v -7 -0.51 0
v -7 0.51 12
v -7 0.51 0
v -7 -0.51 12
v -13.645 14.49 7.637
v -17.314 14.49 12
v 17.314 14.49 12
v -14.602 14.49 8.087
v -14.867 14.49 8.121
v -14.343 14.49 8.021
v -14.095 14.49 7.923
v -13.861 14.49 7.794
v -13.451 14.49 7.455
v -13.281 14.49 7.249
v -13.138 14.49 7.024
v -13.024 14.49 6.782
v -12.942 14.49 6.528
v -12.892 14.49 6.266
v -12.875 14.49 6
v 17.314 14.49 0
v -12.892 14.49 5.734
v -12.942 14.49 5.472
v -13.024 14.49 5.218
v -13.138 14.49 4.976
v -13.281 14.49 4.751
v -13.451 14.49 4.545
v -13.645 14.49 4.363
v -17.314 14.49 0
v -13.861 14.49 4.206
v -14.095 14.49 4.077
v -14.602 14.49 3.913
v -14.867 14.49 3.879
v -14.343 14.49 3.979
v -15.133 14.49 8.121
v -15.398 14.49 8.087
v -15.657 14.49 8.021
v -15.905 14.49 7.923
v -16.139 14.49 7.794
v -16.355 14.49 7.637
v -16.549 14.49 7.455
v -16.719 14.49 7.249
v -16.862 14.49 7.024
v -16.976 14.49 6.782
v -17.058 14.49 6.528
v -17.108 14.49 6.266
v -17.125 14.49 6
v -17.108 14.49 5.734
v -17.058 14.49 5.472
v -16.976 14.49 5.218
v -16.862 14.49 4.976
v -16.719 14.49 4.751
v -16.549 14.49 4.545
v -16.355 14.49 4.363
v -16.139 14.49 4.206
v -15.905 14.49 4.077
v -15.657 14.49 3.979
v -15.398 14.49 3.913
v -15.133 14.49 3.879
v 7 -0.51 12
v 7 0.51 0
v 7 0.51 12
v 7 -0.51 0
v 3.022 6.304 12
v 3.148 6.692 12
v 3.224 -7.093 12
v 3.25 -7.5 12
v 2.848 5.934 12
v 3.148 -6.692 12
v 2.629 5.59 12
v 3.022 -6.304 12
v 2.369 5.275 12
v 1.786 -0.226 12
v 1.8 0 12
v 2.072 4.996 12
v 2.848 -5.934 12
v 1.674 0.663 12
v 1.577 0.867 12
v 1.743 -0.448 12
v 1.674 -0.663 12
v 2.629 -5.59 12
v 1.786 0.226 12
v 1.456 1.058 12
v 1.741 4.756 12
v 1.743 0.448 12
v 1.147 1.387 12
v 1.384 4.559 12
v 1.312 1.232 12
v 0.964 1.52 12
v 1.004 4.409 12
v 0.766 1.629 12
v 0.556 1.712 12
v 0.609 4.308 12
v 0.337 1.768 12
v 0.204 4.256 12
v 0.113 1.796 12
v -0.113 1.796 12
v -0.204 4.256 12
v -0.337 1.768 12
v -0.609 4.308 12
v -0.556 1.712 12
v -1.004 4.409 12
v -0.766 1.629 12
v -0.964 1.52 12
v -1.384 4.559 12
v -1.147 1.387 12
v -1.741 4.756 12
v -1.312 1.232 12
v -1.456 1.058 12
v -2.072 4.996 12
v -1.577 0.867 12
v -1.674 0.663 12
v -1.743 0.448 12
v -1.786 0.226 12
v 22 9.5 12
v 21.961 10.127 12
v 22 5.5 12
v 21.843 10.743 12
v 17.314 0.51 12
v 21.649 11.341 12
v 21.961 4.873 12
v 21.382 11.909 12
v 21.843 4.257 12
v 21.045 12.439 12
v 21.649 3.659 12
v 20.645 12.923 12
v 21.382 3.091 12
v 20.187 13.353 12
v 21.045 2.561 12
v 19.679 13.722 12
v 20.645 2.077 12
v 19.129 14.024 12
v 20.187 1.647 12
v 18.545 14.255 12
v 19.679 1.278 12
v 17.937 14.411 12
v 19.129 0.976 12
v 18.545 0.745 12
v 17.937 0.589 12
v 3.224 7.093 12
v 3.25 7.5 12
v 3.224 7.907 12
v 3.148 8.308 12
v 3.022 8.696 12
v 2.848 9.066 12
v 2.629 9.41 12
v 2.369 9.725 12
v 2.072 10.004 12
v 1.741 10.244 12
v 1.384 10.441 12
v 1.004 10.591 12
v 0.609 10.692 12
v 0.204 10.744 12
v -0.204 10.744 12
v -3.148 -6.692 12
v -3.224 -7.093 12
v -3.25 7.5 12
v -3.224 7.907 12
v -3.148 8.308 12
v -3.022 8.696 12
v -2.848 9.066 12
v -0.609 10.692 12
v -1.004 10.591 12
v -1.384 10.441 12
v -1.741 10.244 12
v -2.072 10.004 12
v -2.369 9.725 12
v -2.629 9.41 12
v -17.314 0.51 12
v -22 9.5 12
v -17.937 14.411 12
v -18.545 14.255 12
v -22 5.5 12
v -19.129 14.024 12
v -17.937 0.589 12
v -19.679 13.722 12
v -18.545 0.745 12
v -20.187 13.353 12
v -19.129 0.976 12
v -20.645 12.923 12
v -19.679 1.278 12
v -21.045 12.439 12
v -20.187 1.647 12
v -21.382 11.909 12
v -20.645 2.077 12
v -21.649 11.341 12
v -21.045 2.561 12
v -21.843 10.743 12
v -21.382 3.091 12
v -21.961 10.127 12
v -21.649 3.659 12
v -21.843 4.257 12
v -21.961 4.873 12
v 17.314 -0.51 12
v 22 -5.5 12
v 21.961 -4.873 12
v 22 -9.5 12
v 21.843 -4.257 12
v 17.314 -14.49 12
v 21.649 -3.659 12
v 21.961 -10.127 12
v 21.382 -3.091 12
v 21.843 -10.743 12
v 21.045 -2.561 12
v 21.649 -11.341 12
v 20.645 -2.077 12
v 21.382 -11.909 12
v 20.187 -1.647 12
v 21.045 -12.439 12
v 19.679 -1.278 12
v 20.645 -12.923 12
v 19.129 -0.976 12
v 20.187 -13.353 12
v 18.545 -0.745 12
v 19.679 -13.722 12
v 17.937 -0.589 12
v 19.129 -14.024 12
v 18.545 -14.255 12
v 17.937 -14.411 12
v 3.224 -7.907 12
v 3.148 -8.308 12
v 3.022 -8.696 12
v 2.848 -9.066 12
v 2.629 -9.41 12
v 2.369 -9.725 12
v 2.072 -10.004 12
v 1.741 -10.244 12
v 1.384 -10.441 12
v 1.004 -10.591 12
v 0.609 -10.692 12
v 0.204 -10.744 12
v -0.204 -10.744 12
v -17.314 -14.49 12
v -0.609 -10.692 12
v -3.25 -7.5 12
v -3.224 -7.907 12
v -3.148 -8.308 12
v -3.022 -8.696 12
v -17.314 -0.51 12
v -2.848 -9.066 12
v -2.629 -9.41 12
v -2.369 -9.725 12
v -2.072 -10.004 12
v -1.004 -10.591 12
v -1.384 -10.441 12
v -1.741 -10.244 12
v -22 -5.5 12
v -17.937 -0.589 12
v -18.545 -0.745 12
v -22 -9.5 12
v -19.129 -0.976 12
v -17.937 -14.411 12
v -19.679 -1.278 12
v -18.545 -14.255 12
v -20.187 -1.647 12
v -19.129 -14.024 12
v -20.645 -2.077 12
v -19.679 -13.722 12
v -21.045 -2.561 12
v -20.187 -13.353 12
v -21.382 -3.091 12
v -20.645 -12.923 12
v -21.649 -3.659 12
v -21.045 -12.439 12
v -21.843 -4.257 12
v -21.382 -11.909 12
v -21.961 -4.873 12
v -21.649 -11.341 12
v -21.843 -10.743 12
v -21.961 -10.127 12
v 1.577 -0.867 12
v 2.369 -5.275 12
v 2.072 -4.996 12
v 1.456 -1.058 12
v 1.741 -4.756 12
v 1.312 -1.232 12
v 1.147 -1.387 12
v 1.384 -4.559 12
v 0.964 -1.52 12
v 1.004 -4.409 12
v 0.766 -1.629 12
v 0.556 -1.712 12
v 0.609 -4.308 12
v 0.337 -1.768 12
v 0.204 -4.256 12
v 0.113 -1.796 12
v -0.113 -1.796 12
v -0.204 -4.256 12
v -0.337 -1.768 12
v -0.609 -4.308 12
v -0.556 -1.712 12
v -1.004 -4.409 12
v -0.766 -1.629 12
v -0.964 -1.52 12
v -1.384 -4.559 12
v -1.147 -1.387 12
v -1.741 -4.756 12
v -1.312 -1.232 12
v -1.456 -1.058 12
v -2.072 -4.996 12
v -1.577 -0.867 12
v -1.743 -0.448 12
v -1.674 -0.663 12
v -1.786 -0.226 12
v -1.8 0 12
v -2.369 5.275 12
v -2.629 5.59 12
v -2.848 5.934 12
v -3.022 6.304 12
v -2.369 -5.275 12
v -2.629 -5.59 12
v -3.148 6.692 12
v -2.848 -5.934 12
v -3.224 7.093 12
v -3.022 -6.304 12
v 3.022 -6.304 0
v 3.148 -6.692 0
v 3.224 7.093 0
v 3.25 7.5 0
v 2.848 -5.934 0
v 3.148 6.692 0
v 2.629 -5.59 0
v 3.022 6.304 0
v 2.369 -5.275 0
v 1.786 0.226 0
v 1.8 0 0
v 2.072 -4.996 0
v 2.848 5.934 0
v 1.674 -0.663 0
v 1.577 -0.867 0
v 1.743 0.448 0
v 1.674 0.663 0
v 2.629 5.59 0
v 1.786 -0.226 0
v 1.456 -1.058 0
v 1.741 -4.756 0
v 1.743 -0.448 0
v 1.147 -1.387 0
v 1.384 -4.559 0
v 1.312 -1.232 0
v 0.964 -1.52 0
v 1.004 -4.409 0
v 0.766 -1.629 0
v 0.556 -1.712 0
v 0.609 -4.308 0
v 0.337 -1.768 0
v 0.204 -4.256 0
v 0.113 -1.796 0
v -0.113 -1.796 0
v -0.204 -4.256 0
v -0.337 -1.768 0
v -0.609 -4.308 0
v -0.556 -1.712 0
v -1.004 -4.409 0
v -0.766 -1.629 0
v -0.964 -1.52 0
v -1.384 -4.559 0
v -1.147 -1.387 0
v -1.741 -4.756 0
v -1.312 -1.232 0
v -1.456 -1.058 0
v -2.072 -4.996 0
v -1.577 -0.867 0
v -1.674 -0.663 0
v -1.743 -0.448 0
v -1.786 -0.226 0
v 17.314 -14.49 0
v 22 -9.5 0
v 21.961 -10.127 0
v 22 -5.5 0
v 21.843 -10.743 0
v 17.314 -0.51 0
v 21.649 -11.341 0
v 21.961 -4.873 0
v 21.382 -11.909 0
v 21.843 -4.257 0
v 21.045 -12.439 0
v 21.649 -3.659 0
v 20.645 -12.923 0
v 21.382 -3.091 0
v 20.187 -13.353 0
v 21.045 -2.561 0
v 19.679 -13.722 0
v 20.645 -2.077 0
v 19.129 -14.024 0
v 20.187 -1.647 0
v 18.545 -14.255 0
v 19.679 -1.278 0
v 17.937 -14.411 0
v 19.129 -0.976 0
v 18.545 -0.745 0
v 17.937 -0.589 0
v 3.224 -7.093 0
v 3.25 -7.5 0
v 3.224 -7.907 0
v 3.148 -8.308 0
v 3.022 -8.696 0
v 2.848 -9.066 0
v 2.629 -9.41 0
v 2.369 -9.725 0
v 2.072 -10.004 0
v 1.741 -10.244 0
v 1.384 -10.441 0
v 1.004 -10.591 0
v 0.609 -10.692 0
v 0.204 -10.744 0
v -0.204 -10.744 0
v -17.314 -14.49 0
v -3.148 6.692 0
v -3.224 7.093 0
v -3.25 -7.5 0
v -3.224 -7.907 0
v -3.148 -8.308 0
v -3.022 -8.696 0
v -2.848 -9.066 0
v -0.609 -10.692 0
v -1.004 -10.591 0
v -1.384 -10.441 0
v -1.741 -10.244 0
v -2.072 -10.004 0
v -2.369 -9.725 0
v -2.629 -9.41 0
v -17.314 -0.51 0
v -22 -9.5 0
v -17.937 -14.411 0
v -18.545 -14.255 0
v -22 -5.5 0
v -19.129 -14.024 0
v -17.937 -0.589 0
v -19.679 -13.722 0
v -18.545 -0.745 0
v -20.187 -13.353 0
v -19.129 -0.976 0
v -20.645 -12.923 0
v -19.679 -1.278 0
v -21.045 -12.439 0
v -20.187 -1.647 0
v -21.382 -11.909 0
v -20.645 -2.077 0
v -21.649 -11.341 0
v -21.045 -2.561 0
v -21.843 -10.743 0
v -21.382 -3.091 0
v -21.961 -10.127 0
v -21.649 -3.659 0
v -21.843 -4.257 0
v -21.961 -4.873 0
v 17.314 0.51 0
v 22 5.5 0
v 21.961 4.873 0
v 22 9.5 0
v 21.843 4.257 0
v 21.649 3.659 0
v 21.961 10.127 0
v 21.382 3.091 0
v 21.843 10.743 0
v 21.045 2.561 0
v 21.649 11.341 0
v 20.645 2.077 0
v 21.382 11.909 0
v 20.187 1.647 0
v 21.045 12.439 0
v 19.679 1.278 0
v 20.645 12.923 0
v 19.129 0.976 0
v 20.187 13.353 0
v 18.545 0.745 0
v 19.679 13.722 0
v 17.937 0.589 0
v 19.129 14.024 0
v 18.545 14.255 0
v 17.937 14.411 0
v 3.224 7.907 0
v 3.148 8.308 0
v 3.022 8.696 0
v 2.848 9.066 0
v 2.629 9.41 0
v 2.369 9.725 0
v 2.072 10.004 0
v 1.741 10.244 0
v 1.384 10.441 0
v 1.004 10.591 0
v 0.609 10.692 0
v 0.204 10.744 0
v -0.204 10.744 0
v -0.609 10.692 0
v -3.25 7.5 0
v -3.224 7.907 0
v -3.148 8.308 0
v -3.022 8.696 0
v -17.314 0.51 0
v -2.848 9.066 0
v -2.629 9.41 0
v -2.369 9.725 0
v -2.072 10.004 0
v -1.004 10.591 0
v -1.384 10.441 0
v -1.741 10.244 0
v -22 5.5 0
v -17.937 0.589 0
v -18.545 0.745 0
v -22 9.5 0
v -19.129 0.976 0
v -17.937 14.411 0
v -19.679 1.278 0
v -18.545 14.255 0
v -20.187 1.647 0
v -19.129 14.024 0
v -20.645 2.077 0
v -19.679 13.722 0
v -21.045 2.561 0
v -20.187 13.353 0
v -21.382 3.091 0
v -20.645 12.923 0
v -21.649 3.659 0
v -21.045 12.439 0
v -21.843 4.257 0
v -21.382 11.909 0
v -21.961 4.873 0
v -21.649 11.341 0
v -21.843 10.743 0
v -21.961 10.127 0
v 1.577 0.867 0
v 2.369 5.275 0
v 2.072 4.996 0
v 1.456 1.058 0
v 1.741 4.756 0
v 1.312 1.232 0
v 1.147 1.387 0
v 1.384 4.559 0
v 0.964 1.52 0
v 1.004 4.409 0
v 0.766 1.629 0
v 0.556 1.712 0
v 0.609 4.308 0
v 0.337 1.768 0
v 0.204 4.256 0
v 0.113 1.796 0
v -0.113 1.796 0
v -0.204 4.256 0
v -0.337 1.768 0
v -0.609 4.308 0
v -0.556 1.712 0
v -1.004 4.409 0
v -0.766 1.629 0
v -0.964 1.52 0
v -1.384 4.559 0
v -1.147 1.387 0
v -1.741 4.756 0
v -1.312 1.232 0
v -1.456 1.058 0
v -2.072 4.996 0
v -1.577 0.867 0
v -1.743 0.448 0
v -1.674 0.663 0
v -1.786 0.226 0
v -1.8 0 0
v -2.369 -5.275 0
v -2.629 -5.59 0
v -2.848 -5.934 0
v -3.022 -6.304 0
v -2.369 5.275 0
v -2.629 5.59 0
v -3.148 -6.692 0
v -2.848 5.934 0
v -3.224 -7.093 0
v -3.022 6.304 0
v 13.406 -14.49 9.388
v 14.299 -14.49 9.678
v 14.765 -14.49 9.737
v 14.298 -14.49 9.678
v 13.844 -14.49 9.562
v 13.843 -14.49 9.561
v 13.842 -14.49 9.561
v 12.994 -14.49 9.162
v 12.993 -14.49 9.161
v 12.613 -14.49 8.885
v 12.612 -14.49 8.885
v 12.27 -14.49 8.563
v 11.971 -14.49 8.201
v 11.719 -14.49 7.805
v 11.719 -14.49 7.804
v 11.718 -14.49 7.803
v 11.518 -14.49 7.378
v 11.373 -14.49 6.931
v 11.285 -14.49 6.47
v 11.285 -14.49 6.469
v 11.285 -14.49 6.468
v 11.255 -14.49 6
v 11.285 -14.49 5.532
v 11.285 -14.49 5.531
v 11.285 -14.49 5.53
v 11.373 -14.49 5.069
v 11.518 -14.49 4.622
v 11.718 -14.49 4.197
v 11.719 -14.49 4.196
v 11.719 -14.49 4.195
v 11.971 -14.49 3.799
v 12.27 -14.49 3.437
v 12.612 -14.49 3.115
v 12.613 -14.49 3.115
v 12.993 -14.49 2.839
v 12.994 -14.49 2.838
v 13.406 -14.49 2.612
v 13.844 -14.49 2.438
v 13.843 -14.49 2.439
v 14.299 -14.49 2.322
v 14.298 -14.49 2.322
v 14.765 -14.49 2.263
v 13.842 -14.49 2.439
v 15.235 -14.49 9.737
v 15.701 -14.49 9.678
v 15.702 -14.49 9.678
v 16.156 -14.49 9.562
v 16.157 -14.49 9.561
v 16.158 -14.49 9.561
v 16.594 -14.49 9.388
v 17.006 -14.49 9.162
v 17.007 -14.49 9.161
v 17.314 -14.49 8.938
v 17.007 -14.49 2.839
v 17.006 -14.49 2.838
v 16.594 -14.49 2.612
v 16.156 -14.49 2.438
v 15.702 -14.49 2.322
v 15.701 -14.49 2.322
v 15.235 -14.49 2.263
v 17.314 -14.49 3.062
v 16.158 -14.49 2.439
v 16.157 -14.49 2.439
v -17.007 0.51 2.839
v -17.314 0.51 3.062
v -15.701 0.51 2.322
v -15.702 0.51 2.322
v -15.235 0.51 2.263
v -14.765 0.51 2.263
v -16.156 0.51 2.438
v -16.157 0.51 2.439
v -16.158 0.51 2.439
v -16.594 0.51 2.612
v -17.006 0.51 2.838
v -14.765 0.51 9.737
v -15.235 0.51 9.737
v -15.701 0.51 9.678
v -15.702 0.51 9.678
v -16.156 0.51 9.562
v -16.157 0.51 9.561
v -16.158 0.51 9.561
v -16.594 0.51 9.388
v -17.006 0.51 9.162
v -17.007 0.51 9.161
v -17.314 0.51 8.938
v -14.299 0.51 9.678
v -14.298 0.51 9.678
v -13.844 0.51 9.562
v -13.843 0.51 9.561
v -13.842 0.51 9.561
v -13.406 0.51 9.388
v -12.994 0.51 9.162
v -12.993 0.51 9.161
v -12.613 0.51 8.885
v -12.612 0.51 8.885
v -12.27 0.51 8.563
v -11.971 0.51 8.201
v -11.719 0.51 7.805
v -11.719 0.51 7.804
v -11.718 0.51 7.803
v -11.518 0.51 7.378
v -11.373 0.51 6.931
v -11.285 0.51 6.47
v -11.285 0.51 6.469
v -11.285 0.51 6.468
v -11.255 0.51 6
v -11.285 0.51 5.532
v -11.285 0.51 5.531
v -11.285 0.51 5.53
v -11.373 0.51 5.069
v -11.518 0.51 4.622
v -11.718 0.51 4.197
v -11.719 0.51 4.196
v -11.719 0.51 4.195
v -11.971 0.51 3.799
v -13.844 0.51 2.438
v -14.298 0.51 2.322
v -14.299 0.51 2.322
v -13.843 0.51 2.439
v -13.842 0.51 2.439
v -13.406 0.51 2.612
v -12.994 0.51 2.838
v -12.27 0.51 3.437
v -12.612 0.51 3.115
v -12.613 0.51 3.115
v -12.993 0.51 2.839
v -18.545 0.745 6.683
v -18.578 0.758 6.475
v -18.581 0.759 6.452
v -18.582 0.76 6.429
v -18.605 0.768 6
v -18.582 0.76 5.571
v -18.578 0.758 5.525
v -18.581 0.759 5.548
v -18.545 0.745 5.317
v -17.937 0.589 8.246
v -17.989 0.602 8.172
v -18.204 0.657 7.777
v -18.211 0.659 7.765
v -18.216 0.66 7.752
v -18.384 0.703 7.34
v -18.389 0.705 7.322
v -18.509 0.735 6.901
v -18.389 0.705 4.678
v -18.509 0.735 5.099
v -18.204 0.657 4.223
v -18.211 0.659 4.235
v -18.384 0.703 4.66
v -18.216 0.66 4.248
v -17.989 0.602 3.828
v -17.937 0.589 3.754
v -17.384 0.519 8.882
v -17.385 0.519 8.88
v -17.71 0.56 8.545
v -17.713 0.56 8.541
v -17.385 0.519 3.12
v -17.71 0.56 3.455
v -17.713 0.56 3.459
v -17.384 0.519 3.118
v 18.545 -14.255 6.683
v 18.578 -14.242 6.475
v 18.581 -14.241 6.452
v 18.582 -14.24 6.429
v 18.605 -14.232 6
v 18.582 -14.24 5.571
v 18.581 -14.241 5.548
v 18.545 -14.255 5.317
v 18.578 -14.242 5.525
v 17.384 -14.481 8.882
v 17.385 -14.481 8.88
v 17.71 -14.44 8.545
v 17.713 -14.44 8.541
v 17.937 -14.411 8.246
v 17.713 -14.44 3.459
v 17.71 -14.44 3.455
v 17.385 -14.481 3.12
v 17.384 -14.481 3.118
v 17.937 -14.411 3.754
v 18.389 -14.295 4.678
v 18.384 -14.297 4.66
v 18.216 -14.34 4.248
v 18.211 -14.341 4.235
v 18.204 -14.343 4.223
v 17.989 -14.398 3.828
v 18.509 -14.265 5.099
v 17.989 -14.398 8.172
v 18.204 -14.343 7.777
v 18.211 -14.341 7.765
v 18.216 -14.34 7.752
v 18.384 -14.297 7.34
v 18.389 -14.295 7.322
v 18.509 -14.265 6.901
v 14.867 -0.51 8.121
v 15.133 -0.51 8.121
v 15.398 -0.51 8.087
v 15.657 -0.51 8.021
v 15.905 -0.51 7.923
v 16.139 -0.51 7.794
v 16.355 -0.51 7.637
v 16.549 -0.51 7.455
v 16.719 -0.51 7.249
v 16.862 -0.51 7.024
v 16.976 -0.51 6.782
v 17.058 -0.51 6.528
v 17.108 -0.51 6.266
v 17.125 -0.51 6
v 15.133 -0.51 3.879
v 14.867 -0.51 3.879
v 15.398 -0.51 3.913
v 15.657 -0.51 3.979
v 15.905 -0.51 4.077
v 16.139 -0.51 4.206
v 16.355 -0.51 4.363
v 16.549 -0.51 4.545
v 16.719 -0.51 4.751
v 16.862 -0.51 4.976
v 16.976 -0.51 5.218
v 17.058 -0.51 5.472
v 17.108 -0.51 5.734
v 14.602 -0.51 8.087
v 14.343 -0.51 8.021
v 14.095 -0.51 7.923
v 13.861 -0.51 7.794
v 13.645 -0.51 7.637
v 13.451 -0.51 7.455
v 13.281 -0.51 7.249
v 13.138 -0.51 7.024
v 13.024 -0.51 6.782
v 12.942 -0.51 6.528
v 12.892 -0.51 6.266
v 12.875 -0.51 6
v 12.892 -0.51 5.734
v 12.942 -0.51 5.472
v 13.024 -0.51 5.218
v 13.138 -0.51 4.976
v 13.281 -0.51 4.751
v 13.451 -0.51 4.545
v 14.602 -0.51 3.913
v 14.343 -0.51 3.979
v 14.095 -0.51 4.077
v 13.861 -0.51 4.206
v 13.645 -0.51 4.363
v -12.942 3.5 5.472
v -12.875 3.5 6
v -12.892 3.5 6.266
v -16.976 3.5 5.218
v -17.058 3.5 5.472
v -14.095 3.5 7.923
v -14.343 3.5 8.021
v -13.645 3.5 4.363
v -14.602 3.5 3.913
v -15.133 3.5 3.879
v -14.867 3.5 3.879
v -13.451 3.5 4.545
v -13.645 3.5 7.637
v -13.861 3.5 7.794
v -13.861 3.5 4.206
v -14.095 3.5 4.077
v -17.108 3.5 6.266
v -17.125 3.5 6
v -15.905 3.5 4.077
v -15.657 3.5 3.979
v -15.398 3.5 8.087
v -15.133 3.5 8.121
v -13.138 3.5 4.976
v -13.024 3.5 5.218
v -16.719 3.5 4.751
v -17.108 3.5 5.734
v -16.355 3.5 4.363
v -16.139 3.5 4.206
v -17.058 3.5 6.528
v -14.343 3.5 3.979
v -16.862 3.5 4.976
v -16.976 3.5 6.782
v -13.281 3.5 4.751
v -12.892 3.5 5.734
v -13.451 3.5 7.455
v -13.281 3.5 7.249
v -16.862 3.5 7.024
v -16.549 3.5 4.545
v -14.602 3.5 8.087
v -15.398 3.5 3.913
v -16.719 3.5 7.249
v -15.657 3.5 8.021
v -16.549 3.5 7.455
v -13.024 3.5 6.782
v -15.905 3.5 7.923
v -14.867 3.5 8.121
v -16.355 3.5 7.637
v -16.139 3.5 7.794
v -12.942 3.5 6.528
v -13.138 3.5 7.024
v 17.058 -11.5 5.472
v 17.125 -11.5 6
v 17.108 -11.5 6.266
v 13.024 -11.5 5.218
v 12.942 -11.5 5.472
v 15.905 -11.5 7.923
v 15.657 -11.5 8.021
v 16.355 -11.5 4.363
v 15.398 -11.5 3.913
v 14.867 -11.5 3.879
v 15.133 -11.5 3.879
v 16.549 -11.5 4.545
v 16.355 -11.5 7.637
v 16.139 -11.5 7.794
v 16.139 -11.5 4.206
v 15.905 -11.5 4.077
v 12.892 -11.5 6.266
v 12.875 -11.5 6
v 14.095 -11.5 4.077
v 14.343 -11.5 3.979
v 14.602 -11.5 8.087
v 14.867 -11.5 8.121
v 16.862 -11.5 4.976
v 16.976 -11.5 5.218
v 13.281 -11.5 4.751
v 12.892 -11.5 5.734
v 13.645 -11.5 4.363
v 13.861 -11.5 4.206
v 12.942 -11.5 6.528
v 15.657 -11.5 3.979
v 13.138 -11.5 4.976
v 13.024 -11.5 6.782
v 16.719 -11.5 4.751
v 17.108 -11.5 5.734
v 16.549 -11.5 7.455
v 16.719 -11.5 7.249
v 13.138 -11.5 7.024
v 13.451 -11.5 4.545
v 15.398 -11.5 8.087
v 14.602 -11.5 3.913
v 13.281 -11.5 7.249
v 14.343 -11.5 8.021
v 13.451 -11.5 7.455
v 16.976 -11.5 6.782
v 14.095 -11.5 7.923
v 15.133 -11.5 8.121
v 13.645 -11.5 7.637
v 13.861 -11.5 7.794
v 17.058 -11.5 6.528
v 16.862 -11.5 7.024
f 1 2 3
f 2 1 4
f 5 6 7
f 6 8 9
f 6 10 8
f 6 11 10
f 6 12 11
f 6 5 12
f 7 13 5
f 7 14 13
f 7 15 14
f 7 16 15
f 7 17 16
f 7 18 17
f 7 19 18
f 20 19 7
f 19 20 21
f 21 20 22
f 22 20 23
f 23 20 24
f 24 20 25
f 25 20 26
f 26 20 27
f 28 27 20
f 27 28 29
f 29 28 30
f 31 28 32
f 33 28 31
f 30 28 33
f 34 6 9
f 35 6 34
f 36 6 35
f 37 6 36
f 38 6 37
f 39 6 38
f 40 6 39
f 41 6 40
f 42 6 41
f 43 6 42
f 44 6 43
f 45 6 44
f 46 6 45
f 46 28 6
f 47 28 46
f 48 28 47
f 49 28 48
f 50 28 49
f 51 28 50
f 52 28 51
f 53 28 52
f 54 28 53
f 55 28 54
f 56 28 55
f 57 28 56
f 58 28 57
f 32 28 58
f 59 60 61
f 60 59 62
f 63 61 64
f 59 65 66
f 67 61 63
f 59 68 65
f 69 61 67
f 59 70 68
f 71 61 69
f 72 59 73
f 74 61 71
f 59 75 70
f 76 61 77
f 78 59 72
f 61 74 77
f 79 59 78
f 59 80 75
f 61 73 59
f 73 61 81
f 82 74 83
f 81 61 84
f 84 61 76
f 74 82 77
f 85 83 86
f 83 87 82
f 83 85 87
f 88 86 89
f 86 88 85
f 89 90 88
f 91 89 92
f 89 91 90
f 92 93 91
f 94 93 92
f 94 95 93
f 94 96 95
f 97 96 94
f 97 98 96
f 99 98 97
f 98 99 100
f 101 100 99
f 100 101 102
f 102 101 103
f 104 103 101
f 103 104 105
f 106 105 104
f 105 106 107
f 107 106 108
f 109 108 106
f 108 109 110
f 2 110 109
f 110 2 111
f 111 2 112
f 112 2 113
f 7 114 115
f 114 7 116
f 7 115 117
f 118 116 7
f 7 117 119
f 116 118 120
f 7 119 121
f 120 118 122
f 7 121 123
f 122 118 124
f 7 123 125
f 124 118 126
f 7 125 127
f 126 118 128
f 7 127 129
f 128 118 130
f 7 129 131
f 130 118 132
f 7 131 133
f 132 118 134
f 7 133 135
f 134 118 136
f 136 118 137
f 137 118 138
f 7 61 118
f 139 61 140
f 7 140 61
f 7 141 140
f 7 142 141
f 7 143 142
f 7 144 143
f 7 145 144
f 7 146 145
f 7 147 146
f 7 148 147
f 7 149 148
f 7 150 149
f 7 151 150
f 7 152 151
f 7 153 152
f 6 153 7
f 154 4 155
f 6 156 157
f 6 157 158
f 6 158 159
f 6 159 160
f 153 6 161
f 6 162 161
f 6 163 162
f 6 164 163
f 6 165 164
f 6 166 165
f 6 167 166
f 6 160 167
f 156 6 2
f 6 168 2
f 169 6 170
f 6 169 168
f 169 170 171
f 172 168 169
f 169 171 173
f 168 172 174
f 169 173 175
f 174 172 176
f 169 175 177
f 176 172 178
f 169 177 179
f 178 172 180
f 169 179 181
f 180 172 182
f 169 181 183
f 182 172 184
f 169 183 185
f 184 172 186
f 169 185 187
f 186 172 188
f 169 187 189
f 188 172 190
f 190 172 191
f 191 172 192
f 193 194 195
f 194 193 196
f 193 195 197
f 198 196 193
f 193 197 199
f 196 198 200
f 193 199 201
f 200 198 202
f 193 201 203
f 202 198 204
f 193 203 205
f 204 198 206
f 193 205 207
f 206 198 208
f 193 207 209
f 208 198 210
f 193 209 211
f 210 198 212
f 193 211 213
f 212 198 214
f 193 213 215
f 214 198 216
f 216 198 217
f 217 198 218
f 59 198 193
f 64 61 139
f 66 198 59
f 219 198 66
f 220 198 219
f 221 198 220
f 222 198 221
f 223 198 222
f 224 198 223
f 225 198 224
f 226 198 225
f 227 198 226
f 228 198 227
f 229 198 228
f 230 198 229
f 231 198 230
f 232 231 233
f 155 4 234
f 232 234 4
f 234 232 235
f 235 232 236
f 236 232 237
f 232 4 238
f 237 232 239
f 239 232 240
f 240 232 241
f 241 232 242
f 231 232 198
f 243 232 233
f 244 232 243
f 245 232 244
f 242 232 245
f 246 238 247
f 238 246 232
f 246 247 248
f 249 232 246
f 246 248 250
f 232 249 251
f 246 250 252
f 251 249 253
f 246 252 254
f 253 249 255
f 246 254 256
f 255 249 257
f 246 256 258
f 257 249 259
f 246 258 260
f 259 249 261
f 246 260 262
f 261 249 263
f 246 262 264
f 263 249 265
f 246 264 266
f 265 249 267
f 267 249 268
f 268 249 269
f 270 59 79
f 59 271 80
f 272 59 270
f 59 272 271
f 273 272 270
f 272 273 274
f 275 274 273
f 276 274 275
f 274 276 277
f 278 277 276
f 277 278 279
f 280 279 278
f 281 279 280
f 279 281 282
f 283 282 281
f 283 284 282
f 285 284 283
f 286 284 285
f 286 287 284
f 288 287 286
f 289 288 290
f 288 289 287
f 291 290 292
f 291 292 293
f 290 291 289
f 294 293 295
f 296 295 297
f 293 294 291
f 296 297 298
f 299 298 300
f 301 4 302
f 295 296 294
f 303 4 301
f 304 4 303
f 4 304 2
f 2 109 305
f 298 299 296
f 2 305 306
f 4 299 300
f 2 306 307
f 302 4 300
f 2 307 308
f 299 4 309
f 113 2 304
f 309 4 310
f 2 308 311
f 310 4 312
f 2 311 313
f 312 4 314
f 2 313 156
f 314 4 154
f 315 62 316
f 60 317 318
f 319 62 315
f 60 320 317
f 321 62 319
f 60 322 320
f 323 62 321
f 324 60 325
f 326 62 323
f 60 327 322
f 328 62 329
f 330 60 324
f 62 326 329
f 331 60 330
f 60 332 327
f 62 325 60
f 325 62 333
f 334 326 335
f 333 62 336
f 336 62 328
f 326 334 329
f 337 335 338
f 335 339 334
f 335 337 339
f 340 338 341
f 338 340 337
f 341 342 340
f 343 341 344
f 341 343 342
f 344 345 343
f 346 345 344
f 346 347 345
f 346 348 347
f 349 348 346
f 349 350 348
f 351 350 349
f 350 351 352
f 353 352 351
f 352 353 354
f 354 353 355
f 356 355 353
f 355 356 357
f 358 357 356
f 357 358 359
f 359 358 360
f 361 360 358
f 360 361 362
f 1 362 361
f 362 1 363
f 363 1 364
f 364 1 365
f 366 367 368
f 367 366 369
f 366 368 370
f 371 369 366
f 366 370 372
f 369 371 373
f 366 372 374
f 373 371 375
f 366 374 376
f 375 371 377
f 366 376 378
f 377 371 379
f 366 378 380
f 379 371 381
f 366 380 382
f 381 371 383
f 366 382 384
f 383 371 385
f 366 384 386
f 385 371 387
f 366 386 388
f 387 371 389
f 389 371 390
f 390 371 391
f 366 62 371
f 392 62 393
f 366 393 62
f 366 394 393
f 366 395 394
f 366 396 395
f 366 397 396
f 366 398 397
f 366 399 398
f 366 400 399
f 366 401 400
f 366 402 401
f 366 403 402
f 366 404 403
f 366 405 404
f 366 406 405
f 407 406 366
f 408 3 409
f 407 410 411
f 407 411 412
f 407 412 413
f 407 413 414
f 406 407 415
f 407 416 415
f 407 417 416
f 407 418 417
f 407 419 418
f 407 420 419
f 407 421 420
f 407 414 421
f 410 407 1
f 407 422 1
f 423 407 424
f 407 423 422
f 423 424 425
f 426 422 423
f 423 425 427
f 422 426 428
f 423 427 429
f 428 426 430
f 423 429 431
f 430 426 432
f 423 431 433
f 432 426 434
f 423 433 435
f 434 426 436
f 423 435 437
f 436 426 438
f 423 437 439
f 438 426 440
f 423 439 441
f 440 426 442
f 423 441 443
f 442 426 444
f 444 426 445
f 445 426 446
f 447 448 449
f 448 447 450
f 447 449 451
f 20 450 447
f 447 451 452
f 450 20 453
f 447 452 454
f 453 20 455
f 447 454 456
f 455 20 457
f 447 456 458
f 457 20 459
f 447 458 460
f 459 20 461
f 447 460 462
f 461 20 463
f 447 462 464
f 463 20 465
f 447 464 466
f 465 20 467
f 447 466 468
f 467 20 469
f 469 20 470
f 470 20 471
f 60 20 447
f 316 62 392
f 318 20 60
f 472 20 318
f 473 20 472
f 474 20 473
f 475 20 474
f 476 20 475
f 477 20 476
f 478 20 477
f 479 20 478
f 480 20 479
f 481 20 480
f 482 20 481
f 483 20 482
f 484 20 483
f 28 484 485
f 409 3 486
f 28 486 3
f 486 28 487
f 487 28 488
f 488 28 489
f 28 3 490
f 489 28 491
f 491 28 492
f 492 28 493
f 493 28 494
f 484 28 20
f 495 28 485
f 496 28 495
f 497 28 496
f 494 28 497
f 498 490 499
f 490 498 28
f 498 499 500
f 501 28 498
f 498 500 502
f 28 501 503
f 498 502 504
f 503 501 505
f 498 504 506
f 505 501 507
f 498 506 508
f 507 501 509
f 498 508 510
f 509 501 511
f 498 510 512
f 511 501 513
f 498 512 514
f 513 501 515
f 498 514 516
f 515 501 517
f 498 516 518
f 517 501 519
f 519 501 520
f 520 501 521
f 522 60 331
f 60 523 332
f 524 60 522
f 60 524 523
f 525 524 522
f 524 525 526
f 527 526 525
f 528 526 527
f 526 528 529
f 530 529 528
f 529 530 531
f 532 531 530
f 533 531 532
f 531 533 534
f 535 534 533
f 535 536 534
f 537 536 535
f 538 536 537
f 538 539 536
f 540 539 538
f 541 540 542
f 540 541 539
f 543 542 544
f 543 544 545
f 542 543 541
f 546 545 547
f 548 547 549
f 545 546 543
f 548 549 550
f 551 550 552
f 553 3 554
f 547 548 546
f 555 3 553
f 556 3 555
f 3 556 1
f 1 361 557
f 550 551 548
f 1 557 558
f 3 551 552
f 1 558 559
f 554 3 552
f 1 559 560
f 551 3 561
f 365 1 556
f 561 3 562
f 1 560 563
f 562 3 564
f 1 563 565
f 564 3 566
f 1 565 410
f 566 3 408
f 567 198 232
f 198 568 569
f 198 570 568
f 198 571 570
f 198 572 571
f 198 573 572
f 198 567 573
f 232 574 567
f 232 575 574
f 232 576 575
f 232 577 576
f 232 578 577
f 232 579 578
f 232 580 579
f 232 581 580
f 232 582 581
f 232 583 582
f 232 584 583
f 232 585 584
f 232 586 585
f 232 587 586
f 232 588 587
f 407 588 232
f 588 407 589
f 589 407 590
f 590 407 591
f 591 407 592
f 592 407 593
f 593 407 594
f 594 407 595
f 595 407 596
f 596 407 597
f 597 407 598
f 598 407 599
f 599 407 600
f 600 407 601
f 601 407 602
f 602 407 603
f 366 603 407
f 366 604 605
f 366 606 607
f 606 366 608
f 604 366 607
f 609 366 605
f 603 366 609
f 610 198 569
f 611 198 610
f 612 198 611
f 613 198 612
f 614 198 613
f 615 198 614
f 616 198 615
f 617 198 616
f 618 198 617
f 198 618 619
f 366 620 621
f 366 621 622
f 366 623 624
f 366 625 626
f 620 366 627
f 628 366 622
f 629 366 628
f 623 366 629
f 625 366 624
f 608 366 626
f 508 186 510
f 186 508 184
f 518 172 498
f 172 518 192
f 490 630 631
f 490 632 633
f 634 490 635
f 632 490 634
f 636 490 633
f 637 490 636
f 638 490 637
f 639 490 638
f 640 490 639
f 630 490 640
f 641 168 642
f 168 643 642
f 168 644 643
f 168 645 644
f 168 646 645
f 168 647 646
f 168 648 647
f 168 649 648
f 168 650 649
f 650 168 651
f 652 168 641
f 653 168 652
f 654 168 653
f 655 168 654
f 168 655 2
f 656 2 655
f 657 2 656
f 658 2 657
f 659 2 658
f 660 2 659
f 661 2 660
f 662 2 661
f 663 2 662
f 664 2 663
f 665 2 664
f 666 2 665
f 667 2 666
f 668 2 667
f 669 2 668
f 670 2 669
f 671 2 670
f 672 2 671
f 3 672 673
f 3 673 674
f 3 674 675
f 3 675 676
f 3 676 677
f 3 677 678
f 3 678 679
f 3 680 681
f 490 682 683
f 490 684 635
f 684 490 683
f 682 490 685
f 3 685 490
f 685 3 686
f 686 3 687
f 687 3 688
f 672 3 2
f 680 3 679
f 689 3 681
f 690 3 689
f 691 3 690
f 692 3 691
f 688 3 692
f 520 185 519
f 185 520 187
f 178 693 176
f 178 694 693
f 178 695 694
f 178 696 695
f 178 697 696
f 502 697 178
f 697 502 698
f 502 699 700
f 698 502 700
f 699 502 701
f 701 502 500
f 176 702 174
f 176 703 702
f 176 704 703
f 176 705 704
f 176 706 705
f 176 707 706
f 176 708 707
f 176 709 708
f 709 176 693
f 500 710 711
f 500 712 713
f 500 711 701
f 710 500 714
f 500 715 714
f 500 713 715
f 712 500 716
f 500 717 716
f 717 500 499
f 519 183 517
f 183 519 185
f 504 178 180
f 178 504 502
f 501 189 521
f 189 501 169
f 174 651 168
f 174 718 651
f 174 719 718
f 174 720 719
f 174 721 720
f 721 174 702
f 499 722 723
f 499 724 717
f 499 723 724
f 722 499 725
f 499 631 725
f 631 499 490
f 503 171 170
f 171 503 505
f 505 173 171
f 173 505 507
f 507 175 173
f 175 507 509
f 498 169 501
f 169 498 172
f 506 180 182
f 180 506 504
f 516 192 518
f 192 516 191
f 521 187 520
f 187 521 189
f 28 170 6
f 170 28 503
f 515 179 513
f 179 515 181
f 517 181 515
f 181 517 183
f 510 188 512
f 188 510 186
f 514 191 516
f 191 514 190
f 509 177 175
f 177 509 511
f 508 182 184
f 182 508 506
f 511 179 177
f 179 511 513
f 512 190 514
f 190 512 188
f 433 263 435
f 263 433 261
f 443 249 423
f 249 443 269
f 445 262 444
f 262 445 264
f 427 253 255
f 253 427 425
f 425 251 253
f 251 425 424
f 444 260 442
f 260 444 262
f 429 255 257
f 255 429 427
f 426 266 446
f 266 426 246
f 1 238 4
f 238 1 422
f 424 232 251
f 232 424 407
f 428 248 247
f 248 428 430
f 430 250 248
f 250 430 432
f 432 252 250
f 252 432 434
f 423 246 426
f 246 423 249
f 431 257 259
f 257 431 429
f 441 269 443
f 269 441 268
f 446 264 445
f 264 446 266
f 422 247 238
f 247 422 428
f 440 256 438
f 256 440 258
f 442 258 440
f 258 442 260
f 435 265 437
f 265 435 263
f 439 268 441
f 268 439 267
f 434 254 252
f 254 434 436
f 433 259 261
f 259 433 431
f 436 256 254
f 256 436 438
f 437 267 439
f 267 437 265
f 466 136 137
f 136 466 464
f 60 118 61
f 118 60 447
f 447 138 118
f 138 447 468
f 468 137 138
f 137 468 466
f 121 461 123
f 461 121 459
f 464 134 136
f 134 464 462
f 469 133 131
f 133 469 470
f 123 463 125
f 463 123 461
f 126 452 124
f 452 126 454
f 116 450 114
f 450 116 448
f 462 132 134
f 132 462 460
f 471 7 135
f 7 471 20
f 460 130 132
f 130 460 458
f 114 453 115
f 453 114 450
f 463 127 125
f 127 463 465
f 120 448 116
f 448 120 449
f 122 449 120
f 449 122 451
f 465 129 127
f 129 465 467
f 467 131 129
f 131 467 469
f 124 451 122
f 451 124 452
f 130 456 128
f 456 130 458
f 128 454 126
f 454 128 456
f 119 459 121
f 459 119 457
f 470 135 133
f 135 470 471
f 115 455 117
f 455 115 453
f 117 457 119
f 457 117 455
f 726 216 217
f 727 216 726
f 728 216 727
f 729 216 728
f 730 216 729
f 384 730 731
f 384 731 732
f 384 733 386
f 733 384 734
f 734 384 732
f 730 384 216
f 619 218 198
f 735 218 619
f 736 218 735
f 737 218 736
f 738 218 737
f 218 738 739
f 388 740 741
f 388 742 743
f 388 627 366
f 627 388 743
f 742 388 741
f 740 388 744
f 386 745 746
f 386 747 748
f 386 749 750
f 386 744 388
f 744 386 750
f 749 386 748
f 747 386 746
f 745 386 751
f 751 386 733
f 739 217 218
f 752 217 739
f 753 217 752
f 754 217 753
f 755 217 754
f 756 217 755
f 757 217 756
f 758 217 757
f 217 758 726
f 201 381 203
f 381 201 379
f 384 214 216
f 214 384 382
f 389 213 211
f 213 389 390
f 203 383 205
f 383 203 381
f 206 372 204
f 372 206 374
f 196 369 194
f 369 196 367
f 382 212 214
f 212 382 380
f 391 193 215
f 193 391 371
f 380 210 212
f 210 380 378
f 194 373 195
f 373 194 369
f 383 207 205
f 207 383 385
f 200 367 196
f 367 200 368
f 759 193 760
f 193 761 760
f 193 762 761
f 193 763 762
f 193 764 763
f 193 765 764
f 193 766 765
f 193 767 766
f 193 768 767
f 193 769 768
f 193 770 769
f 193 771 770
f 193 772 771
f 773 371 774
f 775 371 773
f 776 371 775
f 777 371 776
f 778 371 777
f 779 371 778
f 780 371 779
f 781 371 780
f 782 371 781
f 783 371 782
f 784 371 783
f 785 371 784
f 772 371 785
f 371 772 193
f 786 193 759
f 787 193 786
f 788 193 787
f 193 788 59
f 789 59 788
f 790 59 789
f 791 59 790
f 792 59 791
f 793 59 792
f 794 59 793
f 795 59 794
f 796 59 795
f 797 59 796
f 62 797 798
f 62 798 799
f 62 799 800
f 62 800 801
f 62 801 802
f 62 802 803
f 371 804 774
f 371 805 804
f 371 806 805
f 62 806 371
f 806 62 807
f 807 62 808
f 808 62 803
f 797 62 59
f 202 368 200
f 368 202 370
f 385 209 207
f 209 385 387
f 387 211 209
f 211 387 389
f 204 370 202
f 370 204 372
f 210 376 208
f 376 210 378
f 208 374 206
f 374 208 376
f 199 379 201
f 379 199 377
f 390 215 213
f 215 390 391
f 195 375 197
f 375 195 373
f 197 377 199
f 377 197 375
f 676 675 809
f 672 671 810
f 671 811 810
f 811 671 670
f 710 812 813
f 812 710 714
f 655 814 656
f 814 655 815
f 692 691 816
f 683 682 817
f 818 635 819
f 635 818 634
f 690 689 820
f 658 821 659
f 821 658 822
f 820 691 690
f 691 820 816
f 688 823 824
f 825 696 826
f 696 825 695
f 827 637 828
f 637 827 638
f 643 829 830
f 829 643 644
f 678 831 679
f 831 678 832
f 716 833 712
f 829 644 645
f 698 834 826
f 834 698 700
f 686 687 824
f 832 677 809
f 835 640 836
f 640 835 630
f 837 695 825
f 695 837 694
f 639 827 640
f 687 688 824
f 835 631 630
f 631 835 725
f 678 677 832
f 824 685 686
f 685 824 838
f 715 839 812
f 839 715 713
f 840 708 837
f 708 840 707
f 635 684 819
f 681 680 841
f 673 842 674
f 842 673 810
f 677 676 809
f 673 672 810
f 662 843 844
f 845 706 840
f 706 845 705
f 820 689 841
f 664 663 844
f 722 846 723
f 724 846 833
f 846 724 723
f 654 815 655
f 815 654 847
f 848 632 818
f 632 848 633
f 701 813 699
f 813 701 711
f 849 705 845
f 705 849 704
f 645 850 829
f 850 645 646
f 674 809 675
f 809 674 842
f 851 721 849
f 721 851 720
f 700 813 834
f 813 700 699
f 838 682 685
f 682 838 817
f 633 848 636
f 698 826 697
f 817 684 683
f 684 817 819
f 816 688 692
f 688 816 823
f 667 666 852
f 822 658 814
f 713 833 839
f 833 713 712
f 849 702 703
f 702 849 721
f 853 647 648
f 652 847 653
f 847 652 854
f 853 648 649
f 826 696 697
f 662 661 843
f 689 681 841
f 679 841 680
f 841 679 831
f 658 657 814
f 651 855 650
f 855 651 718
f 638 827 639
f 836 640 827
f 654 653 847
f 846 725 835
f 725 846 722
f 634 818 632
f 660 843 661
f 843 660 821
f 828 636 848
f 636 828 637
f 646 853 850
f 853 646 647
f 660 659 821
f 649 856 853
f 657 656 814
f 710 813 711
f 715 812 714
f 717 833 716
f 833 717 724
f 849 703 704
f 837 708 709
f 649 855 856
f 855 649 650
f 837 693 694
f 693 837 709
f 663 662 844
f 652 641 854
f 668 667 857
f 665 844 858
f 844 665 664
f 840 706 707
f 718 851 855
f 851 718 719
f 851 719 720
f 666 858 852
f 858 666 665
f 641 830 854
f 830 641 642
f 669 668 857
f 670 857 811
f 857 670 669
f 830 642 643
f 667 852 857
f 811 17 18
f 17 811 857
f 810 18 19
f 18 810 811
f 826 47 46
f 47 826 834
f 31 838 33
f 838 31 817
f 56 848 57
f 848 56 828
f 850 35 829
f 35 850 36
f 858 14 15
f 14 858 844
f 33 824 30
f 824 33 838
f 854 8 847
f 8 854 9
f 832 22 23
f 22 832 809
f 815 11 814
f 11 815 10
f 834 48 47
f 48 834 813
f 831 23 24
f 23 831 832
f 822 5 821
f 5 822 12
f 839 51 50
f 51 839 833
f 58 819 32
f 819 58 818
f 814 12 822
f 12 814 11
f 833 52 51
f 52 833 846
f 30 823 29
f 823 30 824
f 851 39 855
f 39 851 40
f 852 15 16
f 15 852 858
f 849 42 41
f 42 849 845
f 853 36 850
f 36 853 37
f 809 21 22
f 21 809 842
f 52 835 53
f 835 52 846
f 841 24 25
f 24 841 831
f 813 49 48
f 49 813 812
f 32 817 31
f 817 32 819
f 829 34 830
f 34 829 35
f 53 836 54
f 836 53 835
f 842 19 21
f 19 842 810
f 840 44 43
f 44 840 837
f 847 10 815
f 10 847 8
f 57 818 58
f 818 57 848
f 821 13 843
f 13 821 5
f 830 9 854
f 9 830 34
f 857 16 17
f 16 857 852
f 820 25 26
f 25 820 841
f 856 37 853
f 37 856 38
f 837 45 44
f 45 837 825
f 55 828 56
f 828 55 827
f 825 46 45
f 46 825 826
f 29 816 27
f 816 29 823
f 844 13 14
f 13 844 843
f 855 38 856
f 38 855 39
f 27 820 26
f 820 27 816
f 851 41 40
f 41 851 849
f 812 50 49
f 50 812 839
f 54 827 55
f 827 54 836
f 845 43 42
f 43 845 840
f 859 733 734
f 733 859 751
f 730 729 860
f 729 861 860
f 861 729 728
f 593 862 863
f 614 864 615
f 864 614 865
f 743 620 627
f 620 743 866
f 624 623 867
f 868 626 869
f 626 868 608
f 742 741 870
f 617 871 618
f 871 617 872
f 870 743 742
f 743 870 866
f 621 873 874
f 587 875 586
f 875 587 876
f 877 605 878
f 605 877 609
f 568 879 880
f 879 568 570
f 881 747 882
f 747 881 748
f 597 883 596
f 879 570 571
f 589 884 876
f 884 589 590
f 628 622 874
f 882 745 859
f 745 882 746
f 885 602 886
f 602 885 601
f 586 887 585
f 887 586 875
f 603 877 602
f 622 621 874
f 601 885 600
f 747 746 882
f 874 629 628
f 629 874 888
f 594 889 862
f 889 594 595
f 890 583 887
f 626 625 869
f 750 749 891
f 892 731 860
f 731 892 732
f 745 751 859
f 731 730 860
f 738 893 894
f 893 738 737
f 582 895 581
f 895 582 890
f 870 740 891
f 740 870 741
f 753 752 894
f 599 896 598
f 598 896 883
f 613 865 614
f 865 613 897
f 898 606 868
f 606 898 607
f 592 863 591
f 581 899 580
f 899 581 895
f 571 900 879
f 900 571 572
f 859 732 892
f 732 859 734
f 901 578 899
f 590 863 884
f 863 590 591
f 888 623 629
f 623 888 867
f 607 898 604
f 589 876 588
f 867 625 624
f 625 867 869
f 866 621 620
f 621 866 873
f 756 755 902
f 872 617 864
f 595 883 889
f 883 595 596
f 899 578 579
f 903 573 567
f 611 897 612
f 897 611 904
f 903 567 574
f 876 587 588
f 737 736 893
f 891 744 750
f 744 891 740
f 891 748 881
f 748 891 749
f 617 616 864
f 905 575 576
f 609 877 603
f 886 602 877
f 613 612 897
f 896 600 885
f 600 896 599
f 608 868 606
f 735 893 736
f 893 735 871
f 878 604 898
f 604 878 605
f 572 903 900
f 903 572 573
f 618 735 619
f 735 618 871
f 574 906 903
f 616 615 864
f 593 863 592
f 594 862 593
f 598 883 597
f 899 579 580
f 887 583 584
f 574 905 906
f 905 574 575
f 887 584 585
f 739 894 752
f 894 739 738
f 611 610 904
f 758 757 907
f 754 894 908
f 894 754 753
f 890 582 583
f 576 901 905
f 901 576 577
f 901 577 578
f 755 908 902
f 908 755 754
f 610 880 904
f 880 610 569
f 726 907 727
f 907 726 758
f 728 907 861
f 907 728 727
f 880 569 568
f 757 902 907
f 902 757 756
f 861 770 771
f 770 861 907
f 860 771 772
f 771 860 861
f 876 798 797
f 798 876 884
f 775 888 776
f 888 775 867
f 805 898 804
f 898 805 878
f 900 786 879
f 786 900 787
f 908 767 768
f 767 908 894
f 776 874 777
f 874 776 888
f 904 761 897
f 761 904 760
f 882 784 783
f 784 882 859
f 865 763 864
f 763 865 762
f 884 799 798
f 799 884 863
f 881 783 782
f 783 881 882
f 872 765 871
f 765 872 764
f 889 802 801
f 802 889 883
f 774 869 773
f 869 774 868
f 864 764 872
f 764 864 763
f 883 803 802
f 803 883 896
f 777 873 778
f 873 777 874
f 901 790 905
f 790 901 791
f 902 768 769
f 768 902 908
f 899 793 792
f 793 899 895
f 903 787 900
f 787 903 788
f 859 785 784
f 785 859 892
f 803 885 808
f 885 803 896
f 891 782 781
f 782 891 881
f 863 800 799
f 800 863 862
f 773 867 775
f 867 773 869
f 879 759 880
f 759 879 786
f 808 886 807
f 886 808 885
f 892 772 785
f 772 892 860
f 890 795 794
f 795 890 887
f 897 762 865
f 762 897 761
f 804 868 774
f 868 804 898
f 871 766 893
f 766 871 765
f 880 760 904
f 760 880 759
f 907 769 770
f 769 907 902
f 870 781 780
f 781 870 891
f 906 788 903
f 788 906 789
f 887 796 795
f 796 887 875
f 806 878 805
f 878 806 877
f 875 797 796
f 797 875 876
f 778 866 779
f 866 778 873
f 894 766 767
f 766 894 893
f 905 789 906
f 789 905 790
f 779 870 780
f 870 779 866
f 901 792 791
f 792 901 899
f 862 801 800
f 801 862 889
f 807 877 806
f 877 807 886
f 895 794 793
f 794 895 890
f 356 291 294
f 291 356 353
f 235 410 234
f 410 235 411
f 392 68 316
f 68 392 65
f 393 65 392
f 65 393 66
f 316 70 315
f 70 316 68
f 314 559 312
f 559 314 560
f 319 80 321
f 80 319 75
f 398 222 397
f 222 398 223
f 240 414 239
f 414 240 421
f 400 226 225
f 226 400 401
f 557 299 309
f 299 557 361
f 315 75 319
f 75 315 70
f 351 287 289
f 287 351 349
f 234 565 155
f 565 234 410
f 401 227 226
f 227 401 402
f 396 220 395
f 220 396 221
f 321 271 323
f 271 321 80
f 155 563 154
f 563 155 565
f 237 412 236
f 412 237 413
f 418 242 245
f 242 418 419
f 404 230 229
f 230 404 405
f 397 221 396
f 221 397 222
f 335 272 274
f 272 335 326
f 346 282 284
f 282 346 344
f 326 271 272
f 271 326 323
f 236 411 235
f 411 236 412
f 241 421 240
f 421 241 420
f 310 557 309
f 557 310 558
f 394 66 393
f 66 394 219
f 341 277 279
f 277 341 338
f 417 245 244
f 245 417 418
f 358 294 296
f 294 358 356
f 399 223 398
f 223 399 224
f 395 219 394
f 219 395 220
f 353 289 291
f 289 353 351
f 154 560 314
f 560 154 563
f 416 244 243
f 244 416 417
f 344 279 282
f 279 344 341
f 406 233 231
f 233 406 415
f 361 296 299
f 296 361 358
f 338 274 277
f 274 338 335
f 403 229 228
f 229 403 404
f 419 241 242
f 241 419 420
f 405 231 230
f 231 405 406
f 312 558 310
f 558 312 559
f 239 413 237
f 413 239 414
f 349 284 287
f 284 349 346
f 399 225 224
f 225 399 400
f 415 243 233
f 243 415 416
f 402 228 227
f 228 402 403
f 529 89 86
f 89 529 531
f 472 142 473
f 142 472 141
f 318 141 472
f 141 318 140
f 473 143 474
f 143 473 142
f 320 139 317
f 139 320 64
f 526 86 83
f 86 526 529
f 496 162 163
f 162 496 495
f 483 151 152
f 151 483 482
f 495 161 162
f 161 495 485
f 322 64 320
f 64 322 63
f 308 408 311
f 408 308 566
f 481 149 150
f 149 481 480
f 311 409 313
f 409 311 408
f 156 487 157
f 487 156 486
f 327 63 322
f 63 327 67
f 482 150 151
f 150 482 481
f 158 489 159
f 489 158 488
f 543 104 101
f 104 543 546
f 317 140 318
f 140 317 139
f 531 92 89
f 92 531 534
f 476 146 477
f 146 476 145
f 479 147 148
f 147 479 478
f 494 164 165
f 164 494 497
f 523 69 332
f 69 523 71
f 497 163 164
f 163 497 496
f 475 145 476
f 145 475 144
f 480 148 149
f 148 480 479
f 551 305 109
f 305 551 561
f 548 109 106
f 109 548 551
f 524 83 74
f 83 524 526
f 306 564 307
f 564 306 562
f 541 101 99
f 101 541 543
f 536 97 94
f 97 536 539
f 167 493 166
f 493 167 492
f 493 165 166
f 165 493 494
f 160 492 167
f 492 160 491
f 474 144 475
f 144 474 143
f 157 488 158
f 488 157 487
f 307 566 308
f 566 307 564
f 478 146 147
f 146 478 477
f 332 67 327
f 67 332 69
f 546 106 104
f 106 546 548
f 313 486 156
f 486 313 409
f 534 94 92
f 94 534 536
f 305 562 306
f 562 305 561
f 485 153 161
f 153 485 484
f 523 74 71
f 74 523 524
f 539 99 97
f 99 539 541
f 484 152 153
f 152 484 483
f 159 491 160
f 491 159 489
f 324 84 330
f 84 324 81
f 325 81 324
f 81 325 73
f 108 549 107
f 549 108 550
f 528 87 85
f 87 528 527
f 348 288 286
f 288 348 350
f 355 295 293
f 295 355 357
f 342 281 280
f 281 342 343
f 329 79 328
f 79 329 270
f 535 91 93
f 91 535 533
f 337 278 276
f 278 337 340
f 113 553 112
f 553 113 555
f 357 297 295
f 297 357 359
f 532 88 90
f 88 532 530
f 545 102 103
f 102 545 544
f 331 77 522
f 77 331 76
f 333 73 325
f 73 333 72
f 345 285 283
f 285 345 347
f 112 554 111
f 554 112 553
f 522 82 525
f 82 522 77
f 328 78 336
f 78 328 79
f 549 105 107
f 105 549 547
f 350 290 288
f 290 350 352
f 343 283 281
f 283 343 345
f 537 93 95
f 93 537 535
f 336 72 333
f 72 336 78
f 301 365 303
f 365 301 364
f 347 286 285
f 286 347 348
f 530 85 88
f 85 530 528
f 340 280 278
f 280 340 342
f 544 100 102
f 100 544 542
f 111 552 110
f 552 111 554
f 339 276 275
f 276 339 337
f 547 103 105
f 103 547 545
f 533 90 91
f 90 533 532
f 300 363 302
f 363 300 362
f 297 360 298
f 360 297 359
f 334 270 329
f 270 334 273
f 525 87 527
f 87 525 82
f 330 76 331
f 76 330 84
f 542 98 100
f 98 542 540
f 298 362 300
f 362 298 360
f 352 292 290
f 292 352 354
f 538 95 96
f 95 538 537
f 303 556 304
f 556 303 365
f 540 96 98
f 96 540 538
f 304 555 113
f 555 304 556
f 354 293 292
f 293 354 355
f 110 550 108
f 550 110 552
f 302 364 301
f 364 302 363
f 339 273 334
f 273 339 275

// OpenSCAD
$fn = 50;


difference() {
	union() {
		hull() {
			translate(v = [-2.0000000000, 9.5000000000, 0]) {
				cylinder(h = 12, r = 5);
			}
			translate(v = [2.0000000000, 9.5000000000, 0]) {
				cylinder(h = 12, r = 5);
			}
			translate(v = [-2.0000000000, -9.5000000000, 0]) {
				cylinder(h = 12, r = 5);
			}
			translate(v = [2.0000000000, -9.5000000000, 0]) {
				cylinder(h = 12, r = 5);
			}
		}
		translate(v = [-7.5000000000, 7.5000000000, 0]) {
			hull() {
				translate(v = [-9.5000000000, 2.0000000000, 0]) {
					cylinder(h = 12, r = 5);
				}
				translate(v = [9.5000000000, 2.0000000000, 0]) {
					cylinder(h = 12, r = 5);
				}
				translate(v = [-9.5000000000, -2.0000000000, 0]) {
					cylinder(h = 12, r = 5);
				}
				translate(v = [9.5000000000, -2.0000000000, 0]) {
					cylinder(h = 12, r = 5);
				}
			}
		}
		translate(v = [-7.5000000000, -7.5000000000, 0]) {
			hull() {
				translate(v = [-9.5000000000, 2.0000000000, 0]) {
					cylinder(h = 12, r = 5);
				}
				translate(v = [9.5000000000, 2.0000000000, 0]) {
					cylinder(h = 12, r = 5);
				}
				translate(v = [-9.5000000000, -2.0000000000, 0]) {
					cylinder(h = 12, r = 5);
				}
				translate(v = [9.5000000000, -2.0000000000, 0]) {
					cylinder(h = 12, r = 5);
				}
			}
		}
		translate(v = [7.5000000000, 7.5000000000, 0]) {
			hull() {
				translate(v = [-9.5000000000, 2.0000000000, 0]) {
					cylinder(h = 12, r = 5);
				}
				translate(v = [9.5000000000, 2.0000000000, 0]) {
					cylinder(h = 12, r = 5);
				}
				translate(v = [-9.5000000000, -2.0000000000, 0]) {
					cylinder(h = 12, r = 5);
				}
				translate(v = [9.5000000000, -2.0000000000, 0]) {
					cylinder(h = 12, r = 5);
				}
			}
		}
		translate(v = [7.5000000000, -7.5000000000, 0]) {
			hull() {
				translate(v = [-9.5000000000, 2.0000000000, 0]) {
					cylinder(h = 12, r = 5);
				}
				translate(v = [9.5000000000, 2.0000000000, 0]) {
					cylinder(h = 12, r = 5);
				}
				translate(v = [-9.5000000000, -2.0000000000, 0]) {
					cylinder(h = 12, r = 5);
				}
				translate(v = [9.5000000000, -2.0000000000, 0]) {
					cylinder(h = 12, r = 5);
				}
			}
		}
	}
	union() {
		translate(v = [-15.0000000000, 0.5000000000, 6.0000000000]) {
			rotate(a = [90, 0, 0]) {
				difference() {
					union() {
						#translate(v = [0, 0, -14.0000000000]) {
							cylinder(h = 14, r = 2.0000000000);
						}
						#translate(v = [0, 0, -3]) {
							cylinder(h = 3, r1 = 2.1250000000, r2 = 3.7500000000);
						}
						#translate(v = [0, 0, -14.0000000000]) {
							cylinder(h = 14, r = 2.1250000000);
						}
						#translate(v = [0, 0, -14.0000000000]) {
							cylinder(h = 14, r = 2.0000000000);
						}
					}
					union();
				}
			}
		}
		translate(v = [15.0000000000, -14.5000000000, 6.0000000000]) {
			rotate(a = [90, 0, 0]) {
				difference() {
					union() {
						#translate(v = [0, 0, -14.0000000000]) {
							cylinder(h = 14, r = 2.0000000000);
						}
						#translate(v = [0, 0, -3]) {
							cylinder(h = 3, r1 = 2.1250000000, r2 = 3.7500000000);
						}
						#translate(v = [0, 0, -14.0000000000]) {
							cylinder(h = 14, r = 2.1250000000);
						}
						#translate(v = [0, 0, -14.0000000000]) {
							cylinder(h = 14, r = 2.0000000000);
						}
					}
					union();
				}
			}
		}
		translate(v = [0.0000000000, -7.5000000000, 0]) {
			translate(v = [0, 0, -100]) {
				cylinder(h = 200, r = 3.2500000000);
			}
		}
		translate(v = [0.0000000000, 7.5000000000, 0]) {
			translate(v = [0, 0, -100]) {
				cylinder(h = 200, r = 3.2500000000);
			}
		}
		translate(v = [0.0000000000, -7.5000000000, 0]) {
			translate(v = [0, 0, -100]) {
				cylinder(h = 200, r = 1.8000000000);
			}
		}
		translate(v = [0, 0, -100]) {
			cylinder(h = 200, r = 1.8000000000);
		}
		translate(v = [0.0000000000, 7.5000000000, 0]) {
			translate(v = [0, 0, -100]) {
				cylinder(h = 200, r = 1.8000000000);
			}
		}
	}
}
